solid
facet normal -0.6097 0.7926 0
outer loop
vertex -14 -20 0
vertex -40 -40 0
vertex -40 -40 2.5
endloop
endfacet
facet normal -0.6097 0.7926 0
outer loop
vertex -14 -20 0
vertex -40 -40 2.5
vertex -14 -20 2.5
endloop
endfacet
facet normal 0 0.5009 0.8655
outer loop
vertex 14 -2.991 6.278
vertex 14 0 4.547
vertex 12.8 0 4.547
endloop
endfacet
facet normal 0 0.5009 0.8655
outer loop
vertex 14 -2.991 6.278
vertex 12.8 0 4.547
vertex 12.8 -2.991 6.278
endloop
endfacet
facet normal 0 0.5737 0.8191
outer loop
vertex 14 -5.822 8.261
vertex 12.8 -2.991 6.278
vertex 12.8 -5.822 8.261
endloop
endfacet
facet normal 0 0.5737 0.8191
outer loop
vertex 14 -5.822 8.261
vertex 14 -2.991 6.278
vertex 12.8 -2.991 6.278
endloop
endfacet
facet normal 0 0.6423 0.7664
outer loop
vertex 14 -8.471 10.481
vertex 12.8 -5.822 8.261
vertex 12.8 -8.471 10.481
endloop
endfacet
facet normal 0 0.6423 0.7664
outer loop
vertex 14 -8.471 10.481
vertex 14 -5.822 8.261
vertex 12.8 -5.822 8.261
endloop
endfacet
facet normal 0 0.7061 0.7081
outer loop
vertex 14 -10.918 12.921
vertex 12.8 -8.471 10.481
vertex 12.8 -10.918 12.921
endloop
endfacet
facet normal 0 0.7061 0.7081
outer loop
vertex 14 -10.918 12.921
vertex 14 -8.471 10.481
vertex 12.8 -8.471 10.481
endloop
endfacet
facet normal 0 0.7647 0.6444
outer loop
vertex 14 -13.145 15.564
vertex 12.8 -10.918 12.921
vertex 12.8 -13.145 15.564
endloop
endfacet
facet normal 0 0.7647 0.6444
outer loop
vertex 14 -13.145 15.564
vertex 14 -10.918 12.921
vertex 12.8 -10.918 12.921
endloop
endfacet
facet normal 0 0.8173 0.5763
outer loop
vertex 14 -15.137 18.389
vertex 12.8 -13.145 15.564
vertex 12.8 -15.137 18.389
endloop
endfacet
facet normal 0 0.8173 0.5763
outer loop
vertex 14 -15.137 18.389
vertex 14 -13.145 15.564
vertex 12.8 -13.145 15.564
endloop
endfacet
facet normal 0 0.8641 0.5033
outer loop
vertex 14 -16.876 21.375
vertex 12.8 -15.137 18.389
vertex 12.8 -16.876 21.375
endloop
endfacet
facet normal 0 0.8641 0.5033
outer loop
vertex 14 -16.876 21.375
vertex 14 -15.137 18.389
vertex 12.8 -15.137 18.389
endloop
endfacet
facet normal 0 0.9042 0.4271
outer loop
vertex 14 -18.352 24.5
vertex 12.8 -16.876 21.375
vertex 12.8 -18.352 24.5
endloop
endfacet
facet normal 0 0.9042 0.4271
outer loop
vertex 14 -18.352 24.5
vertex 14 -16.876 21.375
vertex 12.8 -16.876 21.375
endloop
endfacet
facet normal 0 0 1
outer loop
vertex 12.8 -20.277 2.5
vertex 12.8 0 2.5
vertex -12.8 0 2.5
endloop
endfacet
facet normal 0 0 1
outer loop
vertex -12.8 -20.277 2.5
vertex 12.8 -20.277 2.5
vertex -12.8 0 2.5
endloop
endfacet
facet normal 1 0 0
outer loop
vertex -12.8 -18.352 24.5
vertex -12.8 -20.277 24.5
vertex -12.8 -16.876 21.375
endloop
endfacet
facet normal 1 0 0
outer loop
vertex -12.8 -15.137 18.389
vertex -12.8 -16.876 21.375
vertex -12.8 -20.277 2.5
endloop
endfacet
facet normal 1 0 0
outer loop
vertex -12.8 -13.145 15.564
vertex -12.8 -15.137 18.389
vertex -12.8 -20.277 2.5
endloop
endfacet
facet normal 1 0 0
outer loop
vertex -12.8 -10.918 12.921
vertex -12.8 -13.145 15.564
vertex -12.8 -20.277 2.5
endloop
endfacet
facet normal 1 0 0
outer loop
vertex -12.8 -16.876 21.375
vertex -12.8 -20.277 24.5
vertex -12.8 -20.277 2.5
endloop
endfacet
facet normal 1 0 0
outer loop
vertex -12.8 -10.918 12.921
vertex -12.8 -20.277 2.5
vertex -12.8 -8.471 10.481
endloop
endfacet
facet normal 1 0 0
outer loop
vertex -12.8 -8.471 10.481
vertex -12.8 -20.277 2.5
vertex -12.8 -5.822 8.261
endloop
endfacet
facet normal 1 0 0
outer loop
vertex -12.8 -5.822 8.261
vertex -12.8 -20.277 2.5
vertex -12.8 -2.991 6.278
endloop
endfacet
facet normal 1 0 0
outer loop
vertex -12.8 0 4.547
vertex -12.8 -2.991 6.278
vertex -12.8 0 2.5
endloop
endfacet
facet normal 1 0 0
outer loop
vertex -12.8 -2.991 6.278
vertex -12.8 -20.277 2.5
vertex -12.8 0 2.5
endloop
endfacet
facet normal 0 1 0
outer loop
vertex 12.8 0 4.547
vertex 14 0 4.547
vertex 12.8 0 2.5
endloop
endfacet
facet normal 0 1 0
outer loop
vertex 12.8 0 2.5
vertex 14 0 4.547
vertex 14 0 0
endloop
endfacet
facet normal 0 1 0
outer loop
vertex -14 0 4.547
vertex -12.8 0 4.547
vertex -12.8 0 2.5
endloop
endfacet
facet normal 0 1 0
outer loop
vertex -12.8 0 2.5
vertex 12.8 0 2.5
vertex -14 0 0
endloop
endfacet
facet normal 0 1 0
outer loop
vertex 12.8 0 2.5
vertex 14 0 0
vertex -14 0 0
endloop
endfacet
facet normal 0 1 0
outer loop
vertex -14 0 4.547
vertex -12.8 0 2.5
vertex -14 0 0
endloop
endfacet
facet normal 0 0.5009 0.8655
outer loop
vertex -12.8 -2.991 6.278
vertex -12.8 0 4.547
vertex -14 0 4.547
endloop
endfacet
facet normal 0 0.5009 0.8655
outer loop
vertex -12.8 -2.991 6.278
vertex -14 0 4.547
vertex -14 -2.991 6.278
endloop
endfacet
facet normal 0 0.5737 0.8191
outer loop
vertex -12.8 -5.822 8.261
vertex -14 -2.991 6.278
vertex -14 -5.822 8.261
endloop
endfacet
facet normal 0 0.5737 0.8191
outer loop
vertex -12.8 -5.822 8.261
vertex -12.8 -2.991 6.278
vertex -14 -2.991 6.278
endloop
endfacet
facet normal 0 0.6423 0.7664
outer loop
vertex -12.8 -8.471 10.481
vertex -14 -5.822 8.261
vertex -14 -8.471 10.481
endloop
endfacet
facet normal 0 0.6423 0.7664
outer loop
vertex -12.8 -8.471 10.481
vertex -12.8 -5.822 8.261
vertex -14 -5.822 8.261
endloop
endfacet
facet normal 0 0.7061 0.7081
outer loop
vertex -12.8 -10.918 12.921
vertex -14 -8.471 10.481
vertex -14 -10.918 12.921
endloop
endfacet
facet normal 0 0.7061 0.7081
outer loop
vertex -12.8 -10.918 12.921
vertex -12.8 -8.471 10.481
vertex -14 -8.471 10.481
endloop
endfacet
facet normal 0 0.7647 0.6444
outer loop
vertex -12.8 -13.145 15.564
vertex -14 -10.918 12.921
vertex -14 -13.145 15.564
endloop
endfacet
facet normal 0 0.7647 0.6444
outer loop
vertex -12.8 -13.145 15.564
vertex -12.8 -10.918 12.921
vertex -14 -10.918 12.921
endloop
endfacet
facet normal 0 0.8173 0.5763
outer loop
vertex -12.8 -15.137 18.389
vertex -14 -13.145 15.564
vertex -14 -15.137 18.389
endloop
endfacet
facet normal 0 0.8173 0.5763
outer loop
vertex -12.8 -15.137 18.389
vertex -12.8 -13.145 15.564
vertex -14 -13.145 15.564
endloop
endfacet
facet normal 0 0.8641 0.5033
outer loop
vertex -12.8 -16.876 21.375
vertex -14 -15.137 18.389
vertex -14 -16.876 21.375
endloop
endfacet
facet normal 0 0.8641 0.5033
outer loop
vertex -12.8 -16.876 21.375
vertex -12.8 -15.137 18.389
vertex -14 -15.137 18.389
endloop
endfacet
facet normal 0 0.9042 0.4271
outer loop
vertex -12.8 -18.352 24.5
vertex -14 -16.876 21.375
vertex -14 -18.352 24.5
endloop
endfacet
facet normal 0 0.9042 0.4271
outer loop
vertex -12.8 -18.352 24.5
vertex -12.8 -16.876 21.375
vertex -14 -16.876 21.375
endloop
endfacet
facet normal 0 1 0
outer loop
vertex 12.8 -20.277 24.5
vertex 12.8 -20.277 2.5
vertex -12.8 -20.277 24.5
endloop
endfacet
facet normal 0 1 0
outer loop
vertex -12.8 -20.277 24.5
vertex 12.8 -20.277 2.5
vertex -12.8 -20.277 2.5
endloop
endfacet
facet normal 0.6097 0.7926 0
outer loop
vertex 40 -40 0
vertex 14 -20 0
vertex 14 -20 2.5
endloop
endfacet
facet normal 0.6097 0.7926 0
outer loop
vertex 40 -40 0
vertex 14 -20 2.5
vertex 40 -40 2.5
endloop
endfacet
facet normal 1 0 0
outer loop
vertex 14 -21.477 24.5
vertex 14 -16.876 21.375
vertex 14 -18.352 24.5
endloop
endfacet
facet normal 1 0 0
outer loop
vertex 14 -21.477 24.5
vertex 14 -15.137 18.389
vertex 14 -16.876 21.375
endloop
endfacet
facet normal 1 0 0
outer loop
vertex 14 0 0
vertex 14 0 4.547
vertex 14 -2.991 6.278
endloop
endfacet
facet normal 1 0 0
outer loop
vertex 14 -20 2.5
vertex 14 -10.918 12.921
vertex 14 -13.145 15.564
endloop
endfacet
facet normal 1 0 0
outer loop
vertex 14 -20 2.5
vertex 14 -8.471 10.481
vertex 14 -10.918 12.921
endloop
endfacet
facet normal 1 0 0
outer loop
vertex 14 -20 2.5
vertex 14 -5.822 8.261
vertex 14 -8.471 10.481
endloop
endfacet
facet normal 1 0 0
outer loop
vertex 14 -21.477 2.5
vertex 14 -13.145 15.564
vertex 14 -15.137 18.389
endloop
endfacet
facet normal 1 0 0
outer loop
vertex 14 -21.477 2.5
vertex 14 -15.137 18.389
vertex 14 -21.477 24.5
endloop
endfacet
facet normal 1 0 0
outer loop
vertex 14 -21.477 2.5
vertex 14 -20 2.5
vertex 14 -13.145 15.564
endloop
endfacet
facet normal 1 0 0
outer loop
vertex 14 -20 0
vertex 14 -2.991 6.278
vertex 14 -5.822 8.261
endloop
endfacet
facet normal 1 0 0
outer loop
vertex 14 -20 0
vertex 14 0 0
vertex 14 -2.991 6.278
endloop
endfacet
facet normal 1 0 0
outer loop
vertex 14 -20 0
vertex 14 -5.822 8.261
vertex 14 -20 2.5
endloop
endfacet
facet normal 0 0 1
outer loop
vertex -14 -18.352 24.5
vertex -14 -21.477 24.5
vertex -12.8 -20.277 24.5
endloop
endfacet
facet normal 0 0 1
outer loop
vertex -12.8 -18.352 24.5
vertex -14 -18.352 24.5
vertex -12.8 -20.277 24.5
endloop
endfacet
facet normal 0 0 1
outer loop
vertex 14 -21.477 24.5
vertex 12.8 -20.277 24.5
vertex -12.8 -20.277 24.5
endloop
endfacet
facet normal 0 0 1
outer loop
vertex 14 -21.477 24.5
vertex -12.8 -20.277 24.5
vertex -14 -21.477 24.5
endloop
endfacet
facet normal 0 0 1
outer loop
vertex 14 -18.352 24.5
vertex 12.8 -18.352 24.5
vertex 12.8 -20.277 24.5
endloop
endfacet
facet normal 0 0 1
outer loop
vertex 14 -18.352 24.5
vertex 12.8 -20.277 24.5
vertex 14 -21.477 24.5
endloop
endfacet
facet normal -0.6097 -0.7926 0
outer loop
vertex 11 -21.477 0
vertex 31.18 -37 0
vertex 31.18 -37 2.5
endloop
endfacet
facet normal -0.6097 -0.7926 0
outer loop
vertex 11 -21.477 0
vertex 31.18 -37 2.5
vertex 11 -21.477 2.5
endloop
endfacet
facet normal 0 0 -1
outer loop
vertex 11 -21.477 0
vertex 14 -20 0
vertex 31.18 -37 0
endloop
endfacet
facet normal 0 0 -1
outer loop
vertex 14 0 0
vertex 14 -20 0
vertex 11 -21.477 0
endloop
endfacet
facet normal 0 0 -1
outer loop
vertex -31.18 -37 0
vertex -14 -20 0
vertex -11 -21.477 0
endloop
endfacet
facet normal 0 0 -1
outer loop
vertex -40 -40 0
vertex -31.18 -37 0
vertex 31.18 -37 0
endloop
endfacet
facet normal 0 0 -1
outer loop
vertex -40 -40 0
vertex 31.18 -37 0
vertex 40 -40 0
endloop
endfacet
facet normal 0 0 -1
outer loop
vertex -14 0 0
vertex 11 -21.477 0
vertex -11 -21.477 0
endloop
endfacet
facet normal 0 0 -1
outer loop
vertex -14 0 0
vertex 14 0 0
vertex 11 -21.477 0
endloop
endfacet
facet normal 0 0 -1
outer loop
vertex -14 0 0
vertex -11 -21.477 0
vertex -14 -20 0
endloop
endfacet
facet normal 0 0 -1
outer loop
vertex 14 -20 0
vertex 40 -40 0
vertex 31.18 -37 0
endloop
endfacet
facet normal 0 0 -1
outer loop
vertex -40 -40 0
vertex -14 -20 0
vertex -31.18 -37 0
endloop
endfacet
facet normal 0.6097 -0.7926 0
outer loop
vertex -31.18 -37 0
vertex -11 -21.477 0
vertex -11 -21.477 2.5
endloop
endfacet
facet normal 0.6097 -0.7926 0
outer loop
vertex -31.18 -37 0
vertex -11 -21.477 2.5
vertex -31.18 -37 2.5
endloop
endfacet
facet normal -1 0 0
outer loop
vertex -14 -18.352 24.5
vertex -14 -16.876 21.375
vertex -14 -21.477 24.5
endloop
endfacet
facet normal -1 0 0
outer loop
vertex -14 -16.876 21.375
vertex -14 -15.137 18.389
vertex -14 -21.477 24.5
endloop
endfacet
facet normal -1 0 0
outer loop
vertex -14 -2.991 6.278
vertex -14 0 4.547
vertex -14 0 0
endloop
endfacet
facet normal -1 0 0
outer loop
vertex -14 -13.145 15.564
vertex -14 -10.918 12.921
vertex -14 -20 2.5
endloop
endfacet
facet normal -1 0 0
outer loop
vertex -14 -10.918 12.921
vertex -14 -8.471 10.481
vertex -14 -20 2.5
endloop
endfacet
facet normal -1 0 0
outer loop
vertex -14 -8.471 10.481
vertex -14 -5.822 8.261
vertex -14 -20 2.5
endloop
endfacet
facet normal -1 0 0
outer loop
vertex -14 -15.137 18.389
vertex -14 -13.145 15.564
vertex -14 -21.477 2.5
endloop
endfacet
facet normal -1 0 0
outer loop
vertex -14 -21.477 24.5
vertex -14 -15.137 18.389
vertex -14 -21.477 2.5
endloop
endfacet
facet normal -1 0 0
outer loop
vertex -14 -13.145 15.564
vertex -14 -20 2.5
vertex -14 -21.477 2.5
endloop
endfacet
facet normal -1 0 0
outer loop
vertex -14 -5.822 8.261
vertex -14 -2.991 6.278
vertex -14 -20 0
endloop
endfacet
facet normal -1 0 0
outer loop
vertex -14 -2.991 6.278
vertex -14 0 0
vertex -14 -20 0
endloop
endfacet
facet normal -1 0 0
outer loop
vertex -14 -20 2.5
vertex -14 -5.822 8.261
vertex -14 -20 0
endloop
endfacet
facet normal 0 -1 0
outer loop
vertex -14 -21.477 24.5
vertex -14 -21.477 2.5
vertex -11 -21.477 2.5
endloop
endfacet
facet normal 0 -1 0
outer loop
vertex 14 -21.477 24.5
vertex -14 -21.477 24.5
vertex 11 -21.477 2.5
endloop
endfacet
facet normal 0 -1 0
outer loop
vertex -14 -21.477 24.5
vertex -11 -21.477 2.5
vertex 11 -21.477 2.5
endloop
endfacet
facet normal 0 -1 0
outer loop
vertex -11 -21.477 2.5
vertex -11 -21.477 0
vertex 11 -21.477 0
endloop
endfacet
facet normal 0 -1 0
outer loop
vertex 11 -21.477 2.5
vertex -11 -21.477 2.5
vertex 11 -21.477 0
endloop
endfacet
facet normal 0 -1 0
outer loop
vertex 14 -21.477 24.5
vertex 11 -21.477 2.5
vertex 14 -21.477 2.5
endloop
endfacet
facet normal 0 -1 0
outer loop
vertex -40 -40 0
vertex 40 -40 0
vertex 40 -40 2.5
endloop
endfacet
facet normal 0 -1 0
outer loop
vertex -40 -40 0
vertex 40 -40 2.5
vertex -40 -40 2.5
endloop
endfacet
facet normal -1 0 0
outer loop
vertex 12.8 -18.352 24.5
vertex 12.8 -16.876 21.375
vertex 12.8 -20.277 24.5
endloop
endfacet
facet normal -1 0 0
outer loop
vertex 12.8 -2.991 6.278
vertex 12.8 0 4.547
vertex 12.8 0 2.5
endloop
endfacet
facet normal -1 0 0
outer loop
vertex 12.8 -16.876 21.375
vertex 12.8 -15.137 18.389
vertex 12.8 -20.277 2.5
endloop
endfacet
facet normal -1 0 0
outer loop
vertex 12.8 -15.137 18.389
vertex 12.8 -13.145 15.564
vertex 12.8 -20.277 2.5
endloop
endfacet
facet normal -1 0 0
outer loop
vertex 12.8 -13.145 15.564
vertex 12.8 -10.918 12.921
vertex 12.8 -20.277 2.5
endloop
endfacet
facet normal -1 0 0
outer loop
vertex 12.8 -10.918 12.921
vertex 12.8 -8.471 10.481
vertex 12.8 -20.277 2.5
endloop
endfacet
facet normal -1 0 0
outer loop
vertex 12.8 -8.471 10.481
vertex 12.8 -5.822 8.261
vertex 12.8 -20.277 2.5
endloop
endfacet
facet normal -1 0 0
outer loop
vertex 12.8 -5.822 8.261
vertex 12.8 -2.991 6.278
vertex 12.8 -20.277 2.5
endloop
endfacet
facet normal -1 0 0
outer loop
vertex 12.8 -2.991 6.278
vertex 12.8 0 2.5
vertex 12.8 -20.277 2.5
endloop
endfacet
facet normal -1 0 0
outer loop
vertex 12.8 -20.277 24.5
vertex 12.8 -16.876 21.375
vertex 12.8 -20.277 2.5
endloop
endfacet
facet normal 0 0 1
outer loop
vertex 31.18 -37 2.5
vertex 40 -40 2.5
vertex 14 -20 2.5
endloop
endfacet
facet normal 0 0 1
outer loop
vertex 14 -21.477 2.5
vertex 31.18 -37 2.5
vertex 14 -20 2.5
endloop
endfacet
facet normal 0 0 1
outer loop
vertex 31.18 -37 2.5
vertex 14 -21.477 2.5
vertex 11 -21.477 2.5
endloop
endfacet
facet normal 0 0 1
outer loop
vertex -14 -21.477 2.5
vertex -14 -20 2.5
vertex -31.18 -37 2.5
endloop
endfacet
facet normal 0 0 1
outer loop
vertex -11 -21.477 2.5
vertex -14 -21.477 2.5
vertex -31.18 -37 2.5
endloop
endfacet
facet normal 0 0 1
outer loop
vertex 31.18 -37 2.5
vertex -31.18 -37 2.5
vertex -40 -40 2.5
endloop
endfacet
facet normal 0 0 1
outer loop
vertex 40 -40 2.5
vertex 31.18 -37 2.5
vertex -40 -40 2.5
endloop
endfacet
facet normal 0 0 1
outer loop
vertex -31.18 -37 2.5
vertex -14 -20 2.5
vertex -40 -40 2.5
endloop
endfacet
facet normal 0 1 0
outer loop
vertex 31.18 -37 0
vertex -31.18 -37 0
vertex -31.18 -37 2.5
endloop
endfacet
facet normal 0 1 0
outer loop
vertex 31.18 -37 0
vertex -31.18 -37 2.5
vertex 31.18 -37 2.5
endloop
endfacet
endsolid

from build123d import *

# Parameters (mm, degrees)
BOSS_EXTRUDE5_DEPTH     = 2.5
BOSS_EXTRUDE6_DEPTH     = 22
CUT_EXTRUDE2_DEPTH      = 72.527966559
CUT_EXTRUDE2_DEPTH_BACK = 72.527966559
SKETCH7_R               = 40


with BuildPart() as part:
    # Sketch2 → Boss-Extrude5 (new body)
    with BuildSketch(Plane.XY):
        Polygon((-14, 0), (14, 0), (14, -20), (40, -40), (-40, -40), (-14, -20), align=None)
        Polygon((-11, -21.477204492), (-31.17963416, -37), (31.17963416, -37), (11, -21.477204492), align=None, mode=Mode.SUBTRACT)
    extrude(amount=BOSS_EXTRUDE5_DEPTH)

    # Sketch6 → Boss-Extrude6 (add)
    with BuildSketch(Plane.XY.offset(2.5)):
        Polygon((-12.8, 0), (-14, 0), (-14, -21.477204492), (14, -21.477204492), (14, 0), (12.8, 0), (12.8, -20.277204492), (-12.8, -20.277204492), align=None)
    extrude(amount=BOSS_EXTRUDE6_DEPTH)

    # Sketch7 → Cut-Extrude2 (cut, two sides: drawn at the far end of the back side and taken through both)
    with BuildSketch(Plane.ZY.offset(14).offset(-CUT_EXTRUDE2_DEPTH_BACK)):
        with Locations((40, 18.522795508)):
            Circle(SKETCH7_R)
    extrude(amount=CUT_EXTRUDE2_DEPTH + CUT_EXTRUDE2_DEPTH_BACK, mode=Mode.SUBTRACT)


solid = part.part
